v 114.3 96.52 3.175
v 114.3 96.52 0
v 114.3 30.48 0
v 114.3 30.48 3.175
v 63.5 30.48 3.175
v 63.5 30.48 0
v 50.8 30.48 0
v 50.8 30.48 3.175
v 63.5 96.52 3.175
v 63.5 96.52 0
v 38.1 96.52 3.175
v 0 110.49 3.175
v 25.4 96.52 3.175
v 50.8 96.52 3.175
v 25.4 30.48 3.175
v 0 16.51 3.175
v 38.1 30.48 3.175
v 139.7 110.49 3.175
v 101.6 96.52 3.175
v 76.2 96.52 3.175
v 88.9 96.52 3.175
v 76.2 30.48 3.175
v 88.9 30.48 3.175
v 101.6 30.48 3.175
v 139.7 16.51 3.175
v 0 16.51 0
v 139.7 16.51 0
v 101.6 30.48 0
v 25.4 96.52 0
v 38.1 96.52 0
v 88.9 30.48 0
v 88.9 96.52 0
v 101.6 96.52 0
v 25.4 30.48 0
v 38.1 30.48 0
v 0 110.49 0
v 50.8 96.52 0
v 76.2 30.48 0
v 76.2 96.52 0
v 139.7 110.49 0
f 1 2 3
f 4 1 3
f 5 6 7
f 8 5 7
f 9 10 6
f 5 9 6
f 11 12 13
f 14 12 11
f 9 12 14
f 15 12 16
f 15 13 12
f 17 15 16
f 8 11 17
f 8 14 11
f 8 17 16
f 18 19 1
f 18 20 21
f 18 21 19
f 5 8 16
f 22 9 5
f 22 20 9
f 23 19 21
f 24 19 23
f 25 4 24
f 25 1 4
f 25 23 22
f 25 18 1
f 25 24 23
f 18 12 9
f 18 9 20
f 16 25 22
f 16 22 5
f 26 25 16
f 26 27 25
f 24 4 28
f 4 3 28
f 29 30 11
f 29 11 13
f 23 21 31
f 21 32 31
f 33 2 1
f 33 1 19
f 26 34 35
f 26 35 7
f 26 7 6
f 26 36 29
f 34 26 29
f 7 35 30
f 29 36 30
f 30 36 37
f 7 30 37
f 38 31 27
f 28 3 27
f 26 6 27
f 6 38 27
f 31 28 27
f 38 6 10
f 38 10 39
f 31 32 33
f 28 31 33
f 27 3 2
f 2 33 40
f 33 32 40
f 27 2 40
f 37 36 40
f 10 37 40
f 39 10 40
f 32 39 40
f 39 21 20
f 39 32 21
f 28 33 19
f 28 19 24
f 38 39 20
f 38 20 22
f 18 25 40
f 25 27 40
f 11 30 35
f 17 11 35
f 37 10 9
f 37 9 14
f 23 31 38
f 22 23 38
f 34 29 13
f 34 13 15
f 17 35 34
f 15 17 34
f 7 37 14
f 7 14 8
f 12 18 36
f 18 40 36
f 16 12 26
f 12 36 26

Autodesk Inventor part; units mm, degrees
ref_plane "YZ Plane" through (0, 0, 0) normal (1, 0, 0) x (0, 1, 0)
ref_plane "XZ Plane" through (0, 0, 0) normal (0, 1, 0) x (-1, 0, 0)
ref_plane "XY Plane" through (0, 0, 0) normal (0, 0, 1) x (1, 0, 0)
sketch "Sketch1" plane through (0, 0, 0) normal (0, 0, 1) x (1, 0, 0)
  line L0 (0, 0) -> (139.7, 0)
  line L1 (139.7, 0) -> (139.7, 127)
  line L2 (139.7, 127) -> (0, 127)
  line L3 (0, 127) -> (0, 0)
  dimension "d0" = 139.7
  dimension "d1" = 127
extrude "Extrusion1" add sketch "Sketch1" along normal blind 3.175
sketch "Sketch2" plane through (0, 0, 3.175) normal (0, 0, 1) x (1, 0, 0)
  line L0 (0, 0) -> (139.7, 0) projected
  line L1 (139.7, 0) -> (139.7, 127) projected
  line L2 (0, 0) -> (139.7, 0)
  line L3 (139.7, 0) -> (139.7, 19.05)
  line L4 (139.7, 19.05) -> (0, 19.05)
  line L5 (0, 19.05) -> (0, 0)
  line L6 (139.7, 127) -> (0, 127) projected
  line L7 (0, 127) -> (19.05, 127)
  line L8 (0, 86.1969) -> (0, 127)
  line L9 (0, 127) -> (139.7, 127)
  line L10 (139.7, 127) -> (139.7, 107.95)
  line L11 (139.7, 107.95) -> (0, 107.95)
  line L12 (0, 107.95) -> (0, 127)
  line L13 (0, 127) -> (19.05, 127)
  line L14 (19.05, 127) -> (19.05, 0)
  line L15 (19.05, 0) -> (0, 0)
  line L16 (0, 0) -> (0, 127)
  line L17 (139.7, 0) -> (120.65, 0)
  line L18 (120.65, 0) -> (120.65, 127)
  line L19 (120.65, 127) -> (139.7, 127)
  line L20 (139.7, 127) -> (139.7, 0)
  point P0 (19.05, 19.05)
  point P1 (19.05, 107.95)
  point P2 (120.65, 107.95)
  point P3 (120.65, 19.05)
  dimension "d4" = 19.05
  dimension "d6" = 19.05
  dimension "d7" = 19.05
extrude "Extrusion2" add sketch "Sketch2" along normal blind 3.175 contours L5 L4 L14 L0 | L14 L4 L18 L0 | L16 L8 L11 L14 L4 | L18 L4 L1 L0 | L18 L11 L1 L4 | L14 L6 L18 L11 | L11 L8 L6 L14 | L18 L6 L1 L11
sketch "Sketch3" plane through (0, 0, 0) normal (0, 0, -1) x (-1, 0, 0)
  line L0 (-19.05, 19.05) -> (-120.65, 19.05) projected
  line L1 (-120.65, 107.95) -> (-19.05, 107.95) projected
  line L2 (-25.4, 107.95) -> (-25.4, 19.05)
  line L3 (-19.05, 107.95) -> (-19.05, 19.05) projected
  line L4 (-38.1, 107.95) -> (-38.1, 19.05)
  line L5 (-114.3, 107.95) -> (-114.3, 19.05)
  line L6 (-101.6, 107.95) -> (-101.6, 19.05)
  line L7 (-120.65, 19.05) -> (-120.65, 107.95) projected
  line L8 (-88.9, 107.95) -> (-88.9, 19.05)
  line L9 (-50.8, 107.95) -> (-50.8, 19.05)
  line L10 (-76.2, 107.95) -> (-76.2, 19.05)
  line L11 (-63.5, 107.95) -> (-63.5, 19.05)
  line L12 (-130.7408, 107.95) -> (-4.1346, 107.95)
  line L13 (0, 127) -> (0, 0) projected
  line L14 (-128.9627, 19.05) -> (-12.6698, 19.05)
  line L15 (-128.9627, 30.48) -> (-12.6698, 30.48)
  line L16 (-130.7408, 96.52) -> (-4.1346, 96.52)
  point P0 (-25.4, 96.52)
  point P1 (-38.1, 96.52)
  point P2 (-38.1, 30.48)
  point P3 (-25.4, 30.48)
  point P4 (-50.8, 96.52)
  point P5 (-63.5, 96.52)
  point P6 (-63.5, 30.48)
  point P7 (-50.8, 30.48)
  point P8 (-76.2, 96.52)
  point P9 (-88.9, 96.52)
  point P10 (-88.9, 30.48)
  point P11 (-76.2, 30.48)
  point P12 (-101.6, 96.52)
  point P13 (-114.3, 96.52)
  point P14 (-114.3, 30.48)
  point P15 (-101.6, 30.48)
  dimension "d14" = 12.7
  dimension "d15" = 6.35
  dimension "d17" = 12.7
  dimension "d18" = 12.7
  dimension "d19" = 12.7
  dimension "d20" = 12.7
  dimension "d21" = 12.7
  dimension "d22" = 12.7
  dimension "d23" = 11.43
  dimension "d24" = 11.43
extrude "Extrusion3" cut sketch "Sketch3" against normal through all contours L15 L4 L16 L2 | L15 L11 L16 L9 | L15 L8 L16 L10 | L15 L5 L16 L6
sketch "Sketch4" plane through (0, 0, 0) normal (0, 0, -1) x (-1, 0, 0)
  line L0 (-120.65, 19.05) -> (-120.65, 107.95) projected
  line L1 (-120.65, 107.95) -> (-19.05, 107.95) projected
  line L2 (-19.05, 107.95) -> (-19.05, 19.05) projected
  line L3 (-19.05, 19.05) -> (-120.65, 19.05) projected
  line L4 (-139.7, 127) -> (0, 127) projected
  line L5 (0, 0) -> (-139.7, 0) projected
  line L6 (-157.0502, 127) -> (65.2705, 127)
  line L7 (-157.0502, 110.49) -> (65.2705, 110.49)
  line L8 (-152.5949, 0) -> (41.6573, 0)
  line L9 (-152.5949, 16.51) -> (41.6573, 16.51)
  line L10 (-147.9168, 24.0704) -> (-145.2436, -7.3397)
  line L11 (8.7478, 21.5847) -> (14.9253, -14.4682)
  line L12 (-146.5802, 130.3299) -> (-146.5802, 103.3752)
  line L13 (-146.5802, 103.3752) -> (-146.5802, 100.0337)
  line L14 (14.9253, 133.2259) -> (10.47, 95.1328)
  point P0 (12.4462, 0)
  point P1 (9.6173, 16.51)
  point P2 (-147.2734, 16.51)
  point P3 (-145.8683, 0)
  point P4 (12.2662, 110.49)
  point P5 (14.1972, 127)
  point P6 (0, 127)
  point P7 (-146.5802, 127)
  point P8 (-146.5802, 110.49)
  dimension "d27" = 127
  dimension "d28" = 16.51
  dimension "d29" = 16.51
extrude "Extrusion4" cut sketch "Sketch4" against normal through all contours L4 L6 L14 L7 L12 | L5 L8 L10 L9 L11
sketch "Sketch6" plane through (139.7, 16.51, 0) normal (1, 0, 0) x (0, 0, -1)
  line L0 (-6.35, 0) -> (-6.35, 93.98) projected
  line L1 (-6.35, 93.98) -> (-3.175, 93.98)
  line L2 (-3.175, 93.98) -> (-3.175, -1176.02)
  line L3 (-3.175, -1176.02) -> (-6.35, -1176.02)
  line L4 (-6.35, -1176.02) -> (-6.35, 93.98)
  point P0 (0, -16.51)
  dimension "d32" = 3.175
  dimension "d33" = 1270
extrude "Extrusion5" cut sketch "Sketch6" against normal through all
sketch "Sketch7" plane through (0, 0, 3.175) normal (0, 0, 1) x (1, 0, 0)
  point P0 (0, 0)
sketch "Sketch8" plane through (0, 0, 3.175) normal (0, 0, 1) x (1, 0, 0)
  line L0 (114.3, 96.52) -> (114.3, 30.48) projected
  line L1 (139.7, 110.49) -> (139.7, 16.51) projected
  point P0 (0, 0)
  dimension "d36" = 25.4
properties part number "frount plate"
